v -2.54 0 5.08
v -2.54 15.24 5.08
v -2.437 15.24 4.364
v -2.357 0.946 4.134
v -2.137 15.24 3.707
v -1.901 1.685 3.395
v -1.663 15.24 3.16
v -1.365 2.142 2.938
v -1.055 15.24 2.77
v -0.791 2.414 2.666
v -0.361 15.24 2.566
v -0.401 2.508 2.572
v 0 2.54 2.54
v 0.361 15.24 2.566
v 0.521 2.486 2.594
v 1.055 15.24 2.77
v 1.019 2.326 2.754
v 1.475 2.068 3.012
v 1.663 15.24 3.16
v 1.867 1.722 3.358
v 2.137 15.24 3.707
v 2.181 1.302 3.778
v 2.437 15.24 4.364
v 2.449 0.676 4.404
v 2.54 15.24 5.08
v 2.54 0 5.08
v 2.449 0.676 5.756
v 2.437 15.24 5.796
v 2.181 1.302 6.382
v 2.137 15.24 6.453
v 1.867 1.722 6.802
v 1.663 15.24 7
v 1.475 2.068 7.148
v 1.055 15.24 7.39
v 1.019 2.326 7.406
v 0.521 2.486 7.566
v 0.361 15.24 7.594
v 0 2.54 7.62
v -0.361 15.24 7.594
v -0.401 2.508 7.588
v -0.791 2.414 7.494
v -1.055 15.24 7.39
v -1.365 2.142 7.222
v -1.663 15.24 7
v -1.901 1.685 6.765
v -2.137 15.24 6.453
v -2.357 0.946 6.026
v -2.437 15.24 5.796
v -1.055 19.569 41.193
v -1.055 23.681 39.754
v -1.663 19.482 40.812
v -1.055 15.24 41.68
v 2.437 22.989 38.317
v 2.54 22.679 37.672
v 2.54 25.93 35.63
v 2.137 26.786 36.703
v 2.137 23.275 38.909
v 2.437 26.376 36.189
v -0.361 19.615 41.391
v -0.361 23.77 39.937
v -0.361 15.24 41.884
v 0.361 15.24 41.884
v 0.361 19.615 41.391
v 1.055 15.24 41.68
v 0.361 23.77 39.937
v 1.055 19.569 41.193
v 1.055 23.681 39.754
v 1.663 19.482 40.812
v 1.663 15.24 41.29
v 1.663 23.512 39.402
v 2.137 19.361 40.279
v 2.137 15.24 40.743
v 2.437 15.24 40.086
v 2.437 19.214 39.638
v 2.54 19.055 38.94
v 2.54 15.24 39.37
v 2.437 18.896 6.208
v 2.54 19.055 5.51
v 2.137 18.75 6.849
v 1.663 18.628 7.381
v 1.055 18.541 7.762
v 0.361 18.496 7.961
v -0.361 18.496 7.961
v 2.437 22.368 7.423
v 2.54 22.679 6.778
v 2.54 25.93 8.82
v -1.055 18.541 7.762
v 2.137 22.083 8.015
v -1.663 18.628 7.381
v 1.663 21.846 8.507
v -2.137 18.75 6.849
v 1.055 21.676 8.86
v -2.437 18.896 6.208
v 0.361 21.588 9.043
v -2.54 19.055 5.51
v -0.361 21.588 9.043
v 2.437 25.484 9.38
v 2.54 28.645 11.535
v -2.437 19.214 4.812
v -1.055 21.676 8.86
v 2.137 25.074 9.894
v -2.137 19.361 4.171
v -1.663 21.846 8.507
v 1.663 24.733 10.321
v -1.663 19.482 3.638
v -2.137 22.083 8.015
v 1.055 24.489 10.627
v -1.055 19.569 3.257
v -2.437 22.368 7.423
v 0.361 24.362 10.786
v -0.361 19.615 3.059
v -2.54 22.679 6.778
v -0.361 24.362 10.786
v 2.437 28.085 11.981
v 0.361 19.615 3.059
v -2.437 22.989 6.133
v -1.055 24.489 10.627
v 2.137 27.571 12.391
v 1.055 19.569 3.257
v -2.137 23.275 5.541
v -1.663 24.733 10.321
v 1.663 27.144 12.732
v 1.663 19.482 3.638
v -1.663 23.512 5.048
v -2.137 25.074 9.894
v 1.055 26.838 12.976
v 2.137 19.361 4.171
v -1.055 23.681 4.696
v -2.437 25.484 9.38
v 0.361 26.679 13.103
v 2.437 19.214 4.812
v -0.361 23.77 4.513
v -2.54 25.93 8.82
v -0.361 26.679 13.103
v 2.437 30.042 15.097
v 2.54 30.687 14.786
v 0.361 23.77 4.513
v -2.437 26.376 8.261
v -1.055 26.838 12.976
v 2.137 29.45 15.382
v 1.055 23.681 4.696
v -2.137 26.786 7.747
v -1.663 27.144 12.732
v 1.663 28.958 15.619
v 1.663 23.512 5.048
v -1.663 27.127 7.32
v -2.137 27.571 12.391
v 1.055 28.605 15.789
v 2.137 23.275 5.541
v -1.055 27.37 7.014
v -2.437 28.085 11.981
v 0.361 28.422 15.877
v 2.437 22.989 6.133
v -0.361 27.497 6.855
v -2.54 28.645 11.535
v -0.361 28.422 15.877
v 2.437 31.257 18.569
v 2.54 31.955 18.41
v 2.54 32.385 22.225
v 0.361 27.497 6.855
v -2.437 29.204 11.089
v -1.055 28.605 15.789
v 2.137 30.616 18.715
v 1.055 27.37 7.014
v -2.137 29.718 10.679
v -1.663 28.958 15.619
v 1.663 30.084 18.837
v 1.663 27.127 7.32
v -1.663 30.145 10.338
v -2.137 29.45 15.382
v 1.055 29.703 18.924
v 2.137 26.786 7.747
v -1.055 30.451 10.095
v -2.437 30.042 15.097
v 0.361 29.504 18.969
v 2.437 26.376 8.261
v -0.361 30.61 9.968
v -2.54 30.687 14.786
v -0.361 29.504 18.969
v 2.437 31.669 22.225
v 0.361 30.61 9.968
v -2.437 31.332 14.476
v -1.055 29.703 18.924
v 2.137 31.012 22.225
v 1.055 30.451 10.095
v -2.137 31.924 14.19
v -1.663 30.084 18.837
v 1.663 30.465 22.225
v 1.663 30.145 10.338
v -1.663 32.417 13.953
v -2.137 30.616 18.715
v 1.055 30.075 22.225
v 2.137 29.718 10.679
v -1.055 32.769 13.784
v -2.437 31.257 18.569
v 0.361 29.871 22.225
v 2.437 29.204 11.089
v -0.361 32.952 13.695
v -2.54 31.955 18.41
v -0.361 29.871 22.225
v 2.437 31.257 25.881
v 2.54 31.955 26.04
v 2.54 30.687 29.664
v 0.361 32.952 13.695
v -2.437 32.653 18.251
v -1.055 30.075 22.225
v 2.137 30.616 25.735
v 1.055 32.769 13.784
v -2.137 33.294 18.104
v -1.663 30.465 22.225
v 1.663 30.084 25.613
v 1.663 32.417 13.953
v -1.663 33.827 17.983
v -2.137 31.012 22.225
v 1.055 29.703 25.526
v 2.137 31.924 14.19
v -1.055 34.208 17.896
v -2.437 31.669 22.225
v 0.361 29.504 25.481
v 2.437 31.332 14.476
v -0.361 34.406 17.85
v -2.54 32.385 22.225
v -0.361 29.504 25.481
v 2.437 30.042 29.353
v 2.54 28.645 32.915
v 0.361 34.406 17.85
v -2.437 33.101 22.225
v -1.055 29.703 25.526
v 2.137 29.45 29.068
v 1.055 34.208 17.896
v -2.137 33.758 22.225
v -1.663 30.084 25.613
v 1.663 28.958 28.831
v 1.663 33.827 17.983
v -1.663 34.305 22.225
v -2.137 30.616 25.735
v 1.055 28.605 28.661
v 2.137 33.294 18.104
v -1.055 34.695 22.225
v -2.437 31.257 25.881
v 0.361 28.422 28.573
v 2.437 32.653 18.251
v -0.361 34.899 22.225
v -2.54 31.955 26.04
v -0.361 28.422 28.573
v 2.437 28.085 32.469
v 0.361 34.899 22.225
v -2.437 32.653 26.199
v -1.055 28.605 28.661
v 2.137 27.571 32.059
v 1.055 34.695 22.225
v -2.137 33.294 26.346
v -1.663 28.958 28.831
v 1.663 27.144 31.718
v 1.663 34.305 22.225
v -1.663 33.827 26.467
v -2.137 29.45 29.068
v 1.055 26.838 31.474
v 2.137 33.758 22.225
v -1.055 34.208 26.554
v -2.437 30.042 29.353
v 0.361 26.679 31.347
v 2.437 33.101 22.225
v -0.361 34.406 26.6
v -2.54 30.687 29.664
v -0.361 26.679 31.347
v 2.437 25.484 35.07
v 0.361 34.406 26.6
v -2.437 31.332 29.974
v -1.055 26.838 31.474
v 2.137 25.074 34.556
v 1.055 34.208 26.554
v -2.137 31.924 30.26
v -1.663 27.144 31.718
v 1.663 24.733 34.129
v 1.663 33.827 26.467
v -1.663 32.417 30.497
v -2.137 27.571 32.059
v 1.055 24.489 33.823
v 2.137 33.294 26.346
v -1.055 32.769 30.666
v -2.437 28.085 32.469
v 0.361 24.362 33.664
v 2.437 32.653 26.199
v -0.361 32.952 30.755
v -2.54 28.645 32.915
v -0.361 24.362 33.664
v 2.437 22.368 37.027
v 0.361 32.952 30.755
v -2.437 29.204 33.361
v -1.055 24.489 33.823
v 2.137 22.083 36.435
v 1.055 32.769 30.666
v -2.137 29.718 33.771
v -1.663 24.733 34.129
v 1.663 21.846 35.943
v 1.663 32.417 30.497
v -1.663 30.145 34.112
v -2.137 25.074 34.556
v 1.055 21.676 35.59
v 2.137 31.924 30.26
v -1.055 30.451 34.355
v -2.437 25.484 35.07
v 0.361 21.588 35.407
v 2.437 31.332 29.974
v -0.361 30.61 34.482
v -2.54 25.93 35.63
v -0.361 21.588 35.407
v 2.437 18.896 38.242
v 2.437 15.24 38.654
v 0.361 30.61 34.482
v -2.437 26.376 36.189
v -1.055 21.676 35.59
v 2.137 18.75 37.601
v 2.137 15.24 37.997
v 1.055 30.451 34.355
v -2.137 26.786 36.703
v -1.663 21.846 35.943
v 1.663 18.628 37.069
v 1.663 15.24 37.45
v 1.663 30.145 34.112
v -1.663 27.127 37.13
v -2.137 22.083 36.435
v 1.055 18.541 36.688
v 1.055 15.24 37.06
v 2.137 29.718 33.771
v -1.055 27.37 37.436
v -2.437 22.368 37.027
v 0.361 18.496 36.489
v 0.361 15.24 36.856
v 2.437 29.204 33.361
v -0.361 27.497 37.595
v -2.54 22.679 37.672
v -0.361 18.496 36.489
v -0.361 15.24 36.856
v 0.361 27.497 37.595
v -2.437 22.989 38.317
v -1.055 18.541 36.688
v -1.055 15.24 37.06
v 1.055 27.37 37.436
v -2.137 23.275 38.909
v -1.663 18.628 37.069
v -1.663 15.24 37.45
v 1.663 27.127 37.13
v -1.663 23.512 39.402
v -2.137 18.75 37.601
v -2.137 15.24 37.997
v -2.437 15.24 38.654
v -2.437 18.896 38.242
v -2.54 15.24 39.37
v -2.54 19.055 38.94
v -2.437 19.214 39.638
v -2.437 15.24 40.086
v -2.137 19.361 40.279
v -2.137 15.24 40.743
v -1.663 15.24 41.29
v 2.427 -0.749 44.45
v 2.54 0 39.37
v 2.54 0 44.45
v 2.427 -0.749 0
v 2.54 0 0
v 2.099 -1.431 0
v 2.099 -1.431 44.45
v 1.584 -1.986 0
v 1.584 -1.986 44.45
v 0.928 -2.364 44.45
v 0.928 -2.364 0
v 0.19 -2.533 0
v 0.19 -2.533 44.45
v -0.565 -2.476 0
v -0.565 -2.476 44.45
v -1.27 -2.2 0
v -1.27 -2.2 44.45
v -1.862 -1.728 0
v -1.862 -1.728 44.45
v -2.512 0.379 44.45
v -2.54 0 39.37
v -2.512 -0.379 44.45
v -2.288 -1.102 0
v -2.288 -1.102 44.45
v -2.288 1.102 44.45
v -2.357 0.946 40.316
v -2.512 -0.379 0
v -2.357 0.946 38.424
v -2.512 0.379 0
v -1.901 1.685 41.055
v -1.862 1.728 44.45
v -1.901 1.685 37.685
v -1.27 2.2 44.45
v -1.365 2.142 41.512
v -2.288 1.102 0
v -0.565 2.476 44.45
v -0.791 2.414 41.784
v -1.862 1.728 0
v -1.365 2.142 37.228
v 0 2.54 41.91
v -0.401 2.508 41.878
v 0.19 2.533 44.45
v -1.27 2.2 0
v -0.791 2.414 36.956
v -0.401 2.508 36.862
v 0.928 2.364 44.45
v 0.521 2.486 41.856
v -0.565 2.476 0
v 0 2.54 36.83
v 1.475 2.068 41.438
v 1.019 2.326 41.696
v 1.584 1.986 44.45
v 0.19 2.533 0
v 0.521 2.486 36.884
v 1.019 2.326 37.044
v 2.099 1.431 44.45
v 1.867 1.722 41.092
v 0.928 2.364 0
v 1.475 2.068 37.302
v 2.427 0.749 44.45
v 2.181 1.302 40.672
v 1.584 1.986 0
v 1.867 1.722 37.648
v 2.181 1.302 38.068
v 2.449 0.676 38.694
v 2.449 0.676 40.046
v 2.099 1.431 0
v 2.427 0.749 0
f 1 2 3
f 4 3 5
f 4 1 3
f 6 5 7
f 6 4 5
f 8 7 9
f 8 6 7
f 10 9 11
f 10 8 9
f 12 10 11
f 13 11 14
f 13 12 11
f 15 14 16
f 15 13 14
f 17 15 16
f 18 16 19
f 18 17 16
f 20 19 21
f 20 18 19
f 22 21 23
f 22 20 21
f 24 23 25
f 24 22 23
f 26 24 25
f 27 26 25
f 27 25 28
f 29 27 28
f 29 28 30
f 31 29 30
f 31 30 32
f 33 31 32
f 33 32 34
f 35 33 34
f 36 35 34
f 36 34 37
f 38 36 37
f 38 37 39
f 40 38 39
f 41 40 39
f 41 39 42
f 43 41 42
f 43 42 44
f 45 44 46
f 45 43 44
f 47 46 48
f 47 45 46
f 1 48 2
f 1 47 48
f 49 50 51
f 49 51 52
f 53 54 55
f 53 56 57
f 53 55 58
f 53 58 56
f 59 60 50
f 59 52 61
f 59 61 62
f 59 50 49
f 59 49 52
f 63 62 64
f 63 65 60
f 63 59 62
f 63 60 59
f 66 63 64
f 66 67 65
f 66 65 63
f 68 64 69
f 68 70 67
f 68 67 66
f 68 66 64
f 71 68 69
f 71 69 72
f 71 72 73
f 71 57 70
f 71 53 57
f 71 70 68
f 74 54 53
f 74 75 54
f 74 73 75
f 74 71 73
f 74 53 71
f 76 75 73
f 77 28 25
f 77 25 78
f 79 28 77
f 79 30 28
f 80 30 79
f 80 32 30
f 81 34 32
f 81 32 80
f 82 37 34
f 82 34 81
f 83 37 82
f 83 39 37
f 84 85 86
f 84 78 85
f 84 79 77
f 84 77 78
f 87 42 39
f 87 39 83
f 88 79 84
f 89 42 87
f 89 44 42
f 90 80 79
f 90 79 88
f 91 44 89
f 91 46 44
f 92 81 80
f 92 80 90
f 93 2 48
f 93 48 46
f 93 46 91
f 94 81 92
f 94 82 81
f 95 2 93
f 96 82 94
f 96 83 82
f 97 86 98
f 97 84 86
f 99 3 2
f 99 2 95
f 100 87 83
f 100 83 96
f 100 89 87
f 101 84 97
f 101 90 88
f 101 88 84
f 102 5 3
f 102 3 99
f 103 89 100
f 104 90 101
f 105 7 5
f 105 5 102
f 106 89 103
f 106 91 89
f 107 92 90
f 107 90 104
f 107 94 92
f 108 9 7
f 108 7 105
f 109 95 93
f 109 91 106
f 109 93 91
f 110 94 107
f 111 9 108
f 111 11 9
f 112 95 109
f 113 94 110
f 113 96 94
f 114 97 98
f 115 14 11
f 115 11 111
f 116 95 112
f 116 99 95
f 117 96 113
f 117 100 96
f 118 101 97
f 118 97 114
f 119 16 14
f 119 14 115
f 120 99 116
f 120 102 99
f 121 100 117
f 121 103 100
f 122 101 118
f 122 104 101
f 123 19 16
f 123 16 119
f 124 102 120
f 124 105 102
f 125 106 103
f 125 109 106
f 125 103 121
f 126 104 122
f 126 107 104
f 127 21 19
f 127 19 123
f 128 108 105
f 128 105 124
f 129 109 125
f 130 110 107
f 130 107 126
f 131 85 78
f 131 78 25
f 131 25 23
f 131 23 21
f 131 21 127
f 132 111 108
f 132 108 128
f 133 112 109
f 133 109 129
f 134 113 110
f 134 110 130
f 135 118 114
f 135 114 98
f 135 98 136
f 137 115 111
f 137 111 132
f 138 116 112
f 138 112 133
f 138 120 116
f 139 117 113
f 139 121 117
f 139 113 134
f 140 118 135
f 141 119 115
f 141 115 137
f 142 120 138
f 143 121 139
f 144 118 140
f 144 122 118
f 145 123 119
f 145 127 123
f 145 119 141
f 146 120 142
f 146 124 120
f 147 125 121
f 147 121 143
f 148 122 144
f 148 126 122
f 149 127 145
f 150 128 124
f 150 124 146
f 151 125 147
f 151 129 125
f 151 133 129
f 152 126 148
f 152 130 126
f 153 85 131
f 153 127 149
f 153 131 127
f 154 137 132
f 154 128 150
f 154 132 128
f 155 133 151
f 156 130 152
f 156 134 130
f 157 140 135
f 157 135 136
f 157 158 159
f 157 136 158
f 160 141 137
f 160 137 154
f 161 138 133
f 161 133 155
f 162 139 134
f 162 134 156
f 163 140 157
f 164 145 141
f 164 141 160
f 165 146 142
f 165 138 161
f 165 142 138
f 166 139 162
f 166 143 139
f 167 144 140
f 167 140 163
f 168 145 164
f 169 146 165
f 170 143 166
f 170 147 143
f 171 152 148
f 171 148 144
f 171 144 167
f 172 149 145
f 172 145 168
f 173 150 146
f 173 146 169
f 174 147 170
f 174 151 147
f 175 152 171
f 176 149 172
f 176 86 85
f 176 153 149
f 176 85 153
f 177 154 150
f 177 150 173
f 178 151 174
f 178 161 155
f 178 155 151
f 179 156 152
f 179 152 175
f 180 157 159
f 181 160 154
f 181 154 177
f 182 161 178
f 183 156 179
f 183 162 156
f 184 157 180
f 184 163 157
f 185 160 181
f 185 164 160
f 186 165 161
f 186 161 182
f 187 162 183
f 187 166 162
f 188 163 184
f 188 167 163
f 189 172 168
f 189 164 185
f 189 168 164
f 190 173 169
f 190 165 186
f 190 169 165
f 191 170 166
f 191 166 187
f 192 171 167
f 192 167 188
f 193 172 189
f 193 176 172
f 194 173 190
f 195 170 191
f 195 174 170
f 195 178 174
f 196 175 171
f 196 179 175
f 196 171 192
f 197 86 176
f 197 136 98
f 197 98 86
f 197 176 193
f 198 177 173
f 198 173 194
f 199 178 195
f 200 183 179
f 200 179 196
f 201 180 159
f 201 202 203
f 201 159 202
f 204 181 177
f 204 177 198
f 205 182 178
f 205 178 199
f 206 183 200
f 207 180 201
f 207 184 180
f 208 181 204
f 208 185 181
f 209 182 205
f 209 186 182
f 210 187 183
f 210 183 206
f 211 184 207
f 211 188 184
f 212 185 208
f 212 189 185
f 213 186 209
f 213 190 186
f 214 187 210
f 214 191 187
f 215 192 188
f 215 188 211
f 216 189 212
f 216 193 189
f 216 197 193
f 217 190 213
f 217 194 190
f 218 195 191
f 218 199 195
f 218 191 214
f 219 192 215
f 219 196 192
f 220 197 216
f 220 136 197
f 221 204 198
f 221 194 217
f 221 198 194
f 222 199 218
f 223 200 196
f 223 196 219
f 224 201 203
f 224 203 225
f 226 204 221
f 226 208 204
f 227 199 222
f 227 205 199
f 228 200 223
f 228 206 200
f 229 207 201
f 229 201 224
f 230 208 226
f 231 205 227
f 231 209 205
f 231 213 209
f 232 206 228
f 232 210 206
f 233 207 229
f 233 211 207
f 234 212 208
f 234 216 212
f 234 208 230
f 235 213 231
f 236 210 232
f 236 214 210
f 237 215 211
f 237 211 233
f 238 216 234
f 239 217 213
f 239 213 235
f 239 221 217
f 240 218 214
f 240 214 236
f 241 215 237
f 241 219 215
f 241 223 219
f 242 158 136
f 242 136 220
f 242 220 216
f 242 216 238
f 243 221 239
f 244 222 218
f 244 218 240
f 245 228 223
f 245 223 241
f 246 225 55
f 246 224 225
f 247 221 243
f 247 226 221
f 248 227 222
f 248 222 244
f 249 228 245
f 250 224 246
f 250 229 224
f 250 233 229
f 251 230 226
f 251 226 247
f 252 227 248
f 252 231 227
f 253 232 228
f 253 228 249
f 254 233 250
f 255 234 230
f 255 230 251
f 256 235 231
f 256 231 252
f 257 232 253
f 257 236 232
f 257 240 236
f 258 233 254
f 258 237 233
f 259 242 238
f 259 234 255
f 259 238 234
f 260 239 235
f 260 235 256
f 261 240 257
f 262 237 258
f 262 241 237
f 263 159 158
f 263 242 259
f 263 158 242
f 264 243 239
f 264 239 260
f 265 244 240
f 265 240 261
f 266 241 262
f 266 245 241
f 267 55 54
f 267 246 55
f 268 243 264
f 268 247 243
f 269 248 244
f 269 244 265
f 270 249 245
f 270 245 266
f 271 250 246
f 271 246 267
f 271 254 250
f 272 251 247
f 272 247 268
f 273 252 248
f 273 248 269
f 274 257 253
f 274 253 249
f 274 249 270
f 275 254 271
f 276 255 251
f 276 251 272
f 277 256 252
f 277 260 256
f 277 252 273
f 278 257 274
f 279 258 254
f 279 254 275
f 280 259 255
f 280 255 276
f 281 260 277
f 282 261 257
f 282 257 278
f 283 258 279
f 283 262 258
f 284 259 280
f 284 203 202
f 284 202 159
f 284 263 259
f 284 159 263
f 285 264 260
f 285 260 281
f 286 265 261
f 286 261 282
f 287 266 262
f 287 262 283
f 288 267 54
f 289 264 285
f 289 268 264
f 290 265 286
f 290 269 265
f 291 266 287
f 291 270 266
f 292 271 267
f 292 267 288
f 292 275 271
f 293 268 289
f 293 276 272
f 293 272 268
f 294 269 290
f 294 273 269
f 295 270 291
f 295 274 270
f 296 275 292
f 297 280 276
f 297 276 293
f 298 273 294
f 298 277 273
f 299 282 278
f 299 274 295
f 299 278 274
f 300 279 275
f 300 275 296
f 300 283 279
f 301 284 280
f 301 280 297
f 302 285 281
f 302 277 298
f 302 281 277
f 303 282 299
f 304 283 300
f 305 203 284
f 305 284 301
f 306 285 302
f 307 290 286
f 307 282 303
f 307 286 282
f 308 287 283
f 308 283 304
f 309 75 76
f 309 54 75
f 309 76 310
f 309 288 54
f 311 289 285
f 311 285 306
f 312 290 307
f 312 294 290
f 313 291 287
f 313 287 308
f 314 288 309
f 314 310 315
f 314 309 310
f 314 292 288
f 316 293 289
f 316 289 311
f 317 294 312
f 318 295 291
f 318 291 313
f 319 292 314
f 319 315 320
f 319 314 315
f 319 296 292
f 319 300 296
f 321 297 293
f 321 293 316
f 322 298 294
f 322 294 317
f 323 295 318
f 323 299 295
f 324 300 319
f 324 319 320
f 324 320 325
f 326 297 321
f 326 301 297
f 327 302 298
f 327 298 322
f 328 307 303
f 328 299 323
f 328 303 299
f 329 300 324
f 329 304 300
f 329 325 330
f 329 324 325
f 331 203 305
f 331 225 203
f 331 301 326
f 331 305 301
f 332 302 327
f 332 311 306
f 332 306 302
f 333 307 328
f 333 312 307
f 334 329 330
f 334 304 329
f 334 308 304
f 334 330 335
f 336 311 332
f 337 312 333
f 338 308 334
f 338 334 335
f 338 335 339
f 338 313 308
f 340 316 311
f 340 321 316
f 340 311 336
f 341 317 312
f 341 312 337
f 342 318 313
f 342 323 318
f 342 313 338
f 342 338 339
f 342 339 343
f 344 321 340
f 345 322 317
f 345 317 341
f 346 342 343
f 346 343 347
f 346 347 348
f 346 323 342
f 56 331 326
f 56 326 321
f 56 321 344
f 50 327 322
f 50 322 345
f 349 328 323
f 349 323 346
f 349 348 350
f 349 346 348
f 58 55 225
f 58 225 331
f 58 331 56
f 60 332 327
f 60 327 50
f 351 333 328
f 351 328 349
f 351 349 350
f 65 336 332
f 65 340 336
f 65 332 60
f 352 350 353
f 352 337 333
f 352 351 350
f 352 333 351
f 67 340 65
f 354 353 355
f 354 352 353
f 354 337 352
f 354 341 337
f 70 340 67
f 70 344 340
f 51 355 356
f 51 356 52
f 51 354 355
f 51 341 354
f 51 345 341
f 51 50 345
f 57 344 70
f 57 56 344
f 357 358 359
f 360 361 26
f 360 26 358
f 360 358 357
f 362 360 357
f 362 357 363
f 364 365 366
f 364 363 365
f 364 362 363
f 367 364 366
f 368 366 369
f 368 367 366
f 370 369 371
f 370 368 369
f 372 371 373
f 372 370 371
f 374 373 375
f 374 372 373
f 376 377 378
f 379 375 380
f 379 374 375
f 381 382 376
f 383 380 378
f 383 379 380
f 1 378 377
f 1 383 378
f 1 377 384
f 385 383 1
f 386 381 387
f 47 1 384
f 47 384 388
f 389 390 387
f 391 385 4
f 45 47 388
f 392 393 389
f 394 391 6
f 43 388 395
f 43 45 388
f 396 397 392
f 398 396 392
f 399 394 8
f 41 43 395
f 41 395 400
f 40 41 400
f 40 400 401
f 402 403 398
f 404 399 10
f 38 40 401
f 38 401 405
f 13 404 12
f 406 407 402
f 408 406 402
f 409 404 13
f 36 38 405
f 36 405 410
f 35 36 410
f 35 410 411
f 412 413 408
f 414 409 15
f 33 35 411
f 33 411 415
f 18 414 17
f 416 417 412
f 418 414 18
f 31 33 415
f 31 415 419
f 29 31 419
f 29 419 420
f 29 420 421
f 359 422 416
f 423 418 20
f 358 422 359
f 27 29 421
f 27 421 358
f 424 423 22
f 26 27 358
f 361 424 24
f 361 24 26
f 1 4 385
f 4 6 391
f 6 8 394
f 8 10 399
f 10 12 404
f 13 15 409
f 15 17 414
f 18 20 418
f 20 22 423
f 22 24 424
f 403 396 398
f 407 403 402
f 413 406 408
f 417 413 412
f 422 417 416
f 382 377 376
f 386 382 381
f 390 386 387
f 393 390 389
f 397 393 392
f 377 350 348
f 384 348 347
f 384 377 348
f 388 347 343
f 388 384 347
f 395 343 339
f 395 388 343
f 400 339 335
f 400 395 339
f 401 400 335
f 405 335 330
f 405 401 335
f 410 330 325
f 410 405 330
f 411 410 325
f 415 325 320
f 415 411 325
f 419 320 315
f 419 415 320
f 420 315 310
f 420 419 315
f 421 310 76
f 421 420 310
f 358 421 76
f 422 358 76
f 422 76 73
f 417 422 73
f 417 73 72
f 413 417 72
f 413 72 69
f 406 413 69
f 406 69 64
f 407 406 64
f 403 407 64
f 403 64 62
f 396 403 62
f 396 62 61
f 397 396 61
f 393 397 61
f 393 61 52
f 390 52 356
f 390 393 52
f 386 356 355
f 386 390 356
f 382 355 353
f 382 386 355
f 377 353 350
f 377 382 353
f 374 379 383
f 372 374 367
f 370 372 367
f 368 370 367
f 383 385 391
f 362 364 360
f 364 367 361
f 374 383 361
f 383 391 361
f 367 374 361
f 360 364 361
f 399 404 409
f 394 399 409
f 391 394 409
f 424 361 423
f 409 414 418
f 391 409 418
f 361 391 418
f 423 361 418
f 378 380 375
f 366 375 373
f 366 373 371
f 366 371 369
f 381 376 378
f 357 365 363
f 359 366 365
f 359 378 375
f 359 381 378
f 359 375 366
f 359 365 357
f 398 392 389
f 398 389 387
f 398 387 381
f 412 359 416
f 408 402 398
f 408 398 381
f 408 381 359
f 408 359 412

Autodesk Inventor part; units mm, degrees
ref_plane "YZ Plane" through (0, 0, 0) normal (1, 0, 0) x (0, 1, 0)
ref_plane "XZ Plane" through (0, 0, 0) normal (0, 1, 0) x (-1, 0, 0)
sketch "Sketch1" plane through (0, 0, 0) normal (0, 0, 1) x (1, 0, 0)
  circle A0 centre (0, 0) radius 2.54
  dimension "d0" = 5.08
extrude "Extrusion1" add sketch "Sketch1" along normal blind 44.45
sketch "Sketch2" plane through (0, 0, 44.45) normal (0, 0, 1) x (1, 0, 0)
  circle A0 centre (0, 0) radius 2.54 projected
  point P0 (0, 2.54)
ref_plane "Work Plane1" through (0, 2.54, 44.45) normal (0, 1, 0) x (-1, 0, 0)
sketch "Sketch3" plane through (0, 2.54, 44.45) normal (0, 1, 0) x (-1, 0, 0)
  circle A0 centre (0, -39.37) radius 2.54
  circle A1 centre (0, -5.08) radius 2.54
  line L0 (2.54, 0) -> (-2.54, 0) projected
  point P0 (0, -44.45)
  dimension "d4" = 5.08
  dimension "d6" = 5.08
  dimension "d7" = 5.08
  dimension "d8" = 5.08
extrude "Extrusion2" add sketch "Sketch3" along normal blind 12.7 and the other way blind 2.54
sketch "Sketch4" plane through (0, 15.24, 39.37) normal (0, 1, 0) x (1, 0, 0)
  circle A0 centre (0, 0) radius 2.54 projected
  line L0 (0, 0) -> (0, 34.29) construction
  line L1 (0, 17.145) -> (4.1545, 17.145) construction
  point P0 (0, 39.37)
  dimension "d14" = 34.29
revolve "Revolution1" add sketch "Sketch4" angle 180 about axis through (0, 15.24, 22.225) along (-1, 0, 0)
properties part number "0D" material "Stainless Steel"
